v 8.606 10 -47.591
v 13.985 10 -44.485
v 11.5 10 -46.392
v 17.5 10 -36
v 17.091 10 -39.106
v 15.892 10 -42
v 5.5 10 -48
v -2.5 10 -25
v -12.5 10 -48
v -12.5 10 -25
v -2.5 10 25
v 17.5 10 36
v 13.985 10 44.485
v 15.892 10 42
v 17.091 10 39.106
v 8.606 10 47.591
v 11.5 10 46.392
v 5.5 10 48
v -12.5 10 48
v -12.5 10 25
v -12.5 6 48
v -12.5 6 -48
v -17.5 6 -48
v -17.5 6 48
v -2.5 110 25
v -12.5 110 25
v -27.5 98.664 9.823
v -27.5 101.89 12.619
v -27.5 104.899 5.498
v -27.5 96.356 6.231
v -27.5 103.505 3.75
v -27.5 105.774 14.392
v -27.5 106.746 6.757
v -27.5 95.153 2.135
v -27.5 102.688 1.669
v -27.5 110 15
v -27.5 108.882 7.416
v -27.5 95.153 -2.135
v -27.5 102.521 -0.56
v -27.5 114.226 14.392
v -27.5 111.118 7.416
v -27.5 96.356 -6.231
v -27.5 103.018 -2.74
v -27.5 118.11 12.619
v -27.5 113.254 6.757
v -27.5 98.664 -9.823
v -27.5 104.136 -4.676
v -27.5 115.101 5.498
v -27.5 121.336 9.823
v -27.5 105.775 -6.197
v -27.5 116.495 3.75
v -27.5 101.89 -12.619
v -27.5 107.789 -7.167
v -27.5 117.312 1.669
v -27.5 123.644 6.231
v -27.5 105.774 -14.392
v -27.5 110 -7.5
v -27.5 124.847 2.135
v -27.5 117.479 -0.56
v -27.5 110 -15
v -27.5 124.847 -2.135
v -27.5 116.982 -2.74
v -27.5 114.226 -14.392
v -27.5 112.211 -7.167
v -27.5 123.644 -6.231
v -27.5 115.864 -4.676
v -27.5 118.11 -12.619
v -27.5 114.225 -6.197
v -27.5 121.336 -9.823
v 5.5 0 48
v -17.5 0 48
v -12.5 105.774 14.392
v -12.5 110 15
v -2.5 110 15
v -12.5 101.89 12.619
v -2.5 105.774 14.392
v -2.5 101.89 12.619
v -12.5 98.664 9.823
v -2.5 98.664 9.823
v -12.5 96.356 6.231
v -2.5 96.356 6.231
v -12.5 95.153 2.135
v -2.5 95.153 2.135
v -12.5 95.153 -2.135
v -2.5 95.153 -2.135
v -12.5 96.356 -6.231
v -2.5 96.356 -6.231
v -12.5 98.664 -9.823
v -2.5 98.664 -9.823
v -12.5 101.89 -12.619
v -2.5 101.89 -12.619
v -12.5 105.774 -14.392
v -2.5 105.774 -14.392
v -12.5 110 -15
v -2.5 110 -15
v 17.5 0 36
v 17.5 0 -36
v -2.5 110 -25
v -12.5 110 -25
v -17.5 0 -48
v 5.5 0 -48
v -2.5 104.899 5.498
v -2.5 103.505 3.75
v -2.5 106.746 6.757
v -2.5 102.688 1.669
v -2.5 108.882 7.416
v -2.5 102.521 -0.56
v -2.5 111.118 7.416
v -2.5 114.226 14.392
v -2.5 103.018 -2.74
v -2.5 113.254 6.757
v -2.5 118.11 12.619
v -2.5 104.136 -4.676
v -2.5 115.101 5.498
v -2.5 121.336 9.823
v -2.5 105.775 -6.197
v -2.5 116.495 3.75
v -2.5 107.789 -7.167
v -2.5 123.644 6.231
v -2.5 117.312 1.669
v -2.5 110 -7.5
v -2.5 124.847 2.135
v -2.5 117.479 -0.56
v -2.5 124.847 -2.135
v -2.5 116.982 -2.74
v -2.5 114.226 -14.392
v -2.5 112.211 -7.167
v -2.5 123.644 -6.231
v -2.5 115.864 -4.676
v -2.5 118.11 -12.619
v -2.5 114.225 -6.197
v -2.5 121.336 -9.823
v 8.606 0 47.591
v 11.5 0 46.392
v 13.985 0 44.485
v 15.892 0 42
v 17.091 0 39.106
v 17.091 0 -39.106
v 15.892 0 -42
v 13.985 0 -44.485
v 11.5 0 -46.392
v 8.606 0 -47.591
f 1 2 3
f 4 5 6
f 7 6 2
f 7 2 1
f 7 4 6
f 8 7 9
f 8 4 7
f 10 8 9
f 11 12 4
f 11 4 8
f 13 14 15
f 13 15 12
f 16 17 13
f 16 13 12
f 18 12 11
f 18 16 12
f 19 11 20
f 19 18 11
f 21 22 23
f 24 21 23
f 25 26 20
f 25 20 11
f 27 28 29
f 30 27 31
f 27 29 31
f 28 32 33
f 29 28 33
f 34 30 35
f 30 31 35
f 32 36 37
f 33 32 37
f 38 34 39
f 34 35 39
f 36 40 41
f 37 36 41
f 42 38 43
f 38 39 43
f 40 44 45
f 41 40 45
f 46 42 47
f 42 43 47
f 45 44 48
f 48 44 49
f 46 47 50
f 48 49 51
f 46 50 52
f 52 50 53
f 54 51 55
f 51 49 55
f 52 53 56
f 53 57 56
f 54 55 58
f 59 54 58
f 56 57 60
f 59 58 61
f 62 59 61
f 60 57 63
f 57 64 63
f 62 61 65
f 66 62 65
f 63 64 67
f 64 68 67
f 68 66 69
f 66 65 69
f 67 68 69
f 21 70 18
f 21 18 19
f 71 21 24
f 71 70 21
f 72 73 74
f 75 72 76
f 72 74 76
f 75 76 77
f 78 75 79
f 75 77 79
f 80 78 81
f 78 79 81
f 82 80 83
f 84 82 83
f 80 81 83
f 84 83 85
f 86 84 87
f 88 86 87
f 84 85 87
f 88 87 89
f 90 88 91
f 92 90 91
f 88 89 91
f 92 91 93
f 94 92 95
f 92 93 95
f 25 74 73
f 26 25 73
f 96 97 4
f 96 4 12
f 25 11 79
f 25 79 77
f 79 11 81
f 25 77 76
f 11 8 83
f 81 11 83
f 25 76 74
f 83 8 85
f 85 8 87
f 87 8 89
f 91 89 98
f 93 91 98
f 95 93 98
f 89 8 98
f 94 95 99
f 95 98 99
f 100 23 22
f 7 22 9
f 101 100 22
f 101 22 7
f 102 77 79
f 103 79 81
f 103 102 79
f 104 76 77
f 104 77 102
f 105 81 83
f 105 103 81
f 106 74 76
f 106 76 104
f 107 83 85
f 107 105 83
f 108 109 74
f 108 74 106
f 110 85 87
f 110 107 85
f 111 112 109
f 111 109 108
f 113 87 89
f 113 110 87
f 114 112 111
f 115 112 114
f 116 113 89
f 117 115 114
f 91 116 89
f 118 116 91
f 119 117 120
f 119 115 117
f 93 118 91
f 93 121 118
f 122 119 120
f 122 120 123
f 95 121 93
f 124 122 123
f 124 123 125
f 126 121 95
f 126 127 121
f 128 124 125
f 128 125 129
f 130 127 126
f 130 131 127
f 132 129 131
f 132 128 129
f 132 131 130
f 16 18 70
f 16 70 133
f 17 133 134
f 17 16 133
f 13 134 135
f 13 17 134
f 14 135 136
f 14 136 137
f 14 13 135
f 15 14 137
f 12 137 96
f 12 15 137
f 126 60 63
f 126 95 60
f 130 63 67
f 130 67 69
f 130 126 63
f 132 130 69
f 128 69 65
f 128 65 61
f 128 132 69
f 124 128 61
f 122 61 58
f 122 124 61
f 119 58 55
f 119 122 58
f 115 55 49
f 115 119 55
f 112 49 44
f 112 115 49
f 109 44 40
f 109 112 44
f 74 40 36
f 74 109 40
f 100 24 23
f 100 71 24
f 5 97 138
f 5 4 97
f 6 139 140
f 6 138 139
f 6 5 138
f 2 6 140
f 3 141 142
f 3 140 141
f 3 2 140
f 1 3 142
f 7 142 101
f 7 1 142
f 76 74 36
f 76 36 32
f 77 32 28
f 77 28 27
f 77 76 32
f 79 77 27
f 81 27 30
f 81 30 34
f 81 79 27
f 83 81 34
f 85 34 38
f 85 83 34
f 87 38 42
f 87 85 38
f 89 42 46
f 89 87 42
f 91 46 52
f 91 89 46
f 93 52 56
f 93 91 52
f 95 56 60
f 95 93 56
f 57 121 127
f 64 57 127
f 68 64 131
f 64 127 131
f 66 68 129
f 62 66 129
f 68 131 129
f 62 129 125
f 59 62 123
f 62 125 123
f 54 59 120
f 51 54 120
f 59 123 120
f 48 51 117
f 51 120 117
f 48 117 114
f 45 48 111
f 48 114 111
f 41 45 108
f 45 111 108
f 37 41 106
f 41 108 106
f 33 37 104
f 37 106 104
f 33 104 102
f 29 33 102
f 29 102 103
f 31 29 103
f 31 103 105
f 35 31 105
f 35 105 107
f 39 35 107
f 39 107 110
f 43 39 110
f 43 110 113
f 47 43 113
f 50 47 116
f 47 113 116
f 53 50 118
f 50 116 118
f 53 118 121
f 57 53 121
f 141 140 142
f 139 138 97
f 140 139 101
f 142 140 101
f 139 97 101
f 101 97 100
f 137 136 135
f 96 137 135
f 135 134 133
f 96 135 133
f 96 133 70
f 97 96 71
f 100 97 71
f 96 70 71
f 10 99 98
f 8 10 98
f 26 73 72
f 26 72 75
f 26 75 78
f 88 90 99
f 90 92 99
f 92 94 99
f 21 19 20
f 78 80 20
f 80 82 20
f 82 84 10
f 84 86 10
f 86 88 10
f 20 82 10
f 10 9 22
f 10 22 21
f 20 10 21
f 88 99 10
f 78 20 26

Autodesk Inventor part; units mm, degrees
ref_plane "YZ Plane" through (0, 0, 0) normal (1, 0, 0) x (0, 1, 0)
ref_plane "XZ Plane" through (0, 0, 0) normal (0, 1, 0) x (-1, 0, 0)
ref_plane "XY Plane" through (0, 0, 0) normal (0, 0, 1) x (1, 0, 0)
sketch "Sketch1" plane through (0, 0, 0) normal (0, 1, 0) x (-1, 0, 0)
  line L0 (-17.5, 48) -> (17.5, 48)
  line L1 (17.5, 48) -> (17.5, -48)
  line L2 (17.5, -48) -> (-17.5, -48)
  line L3 (-17.5, -48) -> (-17.5, 48)
  line L4 (-17.5, 48) -> (17.5, -48) construction
  line L5 (17.5, 48) -> (-17.5, -48) construction
  point P0 (0, 0)
  dimension "d0" = 96
  dimension "d1" = 35
extrude "Extrusion1" add sketch "Sketch1" along normal blind 10
fillet "Fillet1" radius 12 2 edges at (17.5, 5, -48) (17.5, 5, 48)
sketch "Sketch2" plane through (-17.5, 0, -48) normal (0, 0, -1) x (-1, 0, 0)
  line L0 (0, 0) -> (0, 10) projected
  line L1 (0, 10) -> (-5, 10)
  line L2 (-5, 10) -> (-5, 6)
  line L3 (-5, 6) -> (0, 6)
  line L4 (0, 6) -> (0, 10)
  line L5 (-23, 0) -> (0, 0) projected
  point P0 (-17.5, 0)
  point P1 (0, 6)
  dimension "d5" = 6
  dimension "d6" = 5
extrude "Extrusion2" cut sketch "Sketch2" against normal through all
sketch "Sketch3" plane through (0, 0, 0) normal (0, 0, 1) x (1, 0, 0)
  line L0 (-12.5, 10) -> (-2.5, 10)
  line L1 (-2.5, 10) -> (-2.5, 110)
  line L2 (-2.5, 110) -> (-12.5, 110)
  line L3 (-12.5, 110) -> (-12.5, 10)
  point P0 (0, 0)
  dimension "d9" = 10
  dimension "d10" = 100
extrude "Extrusion3" add sketch "Sketch3" along normal mid plane 50
sketch "Sketch4" plane through (-2.5, 10, 25) normal (1, 0, 0) x (0, 0, -1)
  line L0 (50, 100) -> (0, 100) projected
  arc A0 (10, 100) -> (40, 100) centre (25, 100) ccw
  point P0 (25, -10)
  dimension "d13" = 30
extrude "Extrusion4" cut sketch "Sketch4" against normal blind 50
sketch "Sketch5" plane through (-2.5, 10, 25) normal (1, 0, 0) x (0, 0, -1)
  arc A0 (10, 100) -> (40, 100) centre (25, 100) ccw projected
  circle A1 centre (25, 100) radius 15
  circle A2 centre (25, 100) radius 7.5
  point P0 (25, -10)
  dimension "d16" = 30
  dimension "d17" = 15
extrude "Extrusion5" add sketch "Sketch5" against normal blind 25 separate body
properties part number "lllll"
